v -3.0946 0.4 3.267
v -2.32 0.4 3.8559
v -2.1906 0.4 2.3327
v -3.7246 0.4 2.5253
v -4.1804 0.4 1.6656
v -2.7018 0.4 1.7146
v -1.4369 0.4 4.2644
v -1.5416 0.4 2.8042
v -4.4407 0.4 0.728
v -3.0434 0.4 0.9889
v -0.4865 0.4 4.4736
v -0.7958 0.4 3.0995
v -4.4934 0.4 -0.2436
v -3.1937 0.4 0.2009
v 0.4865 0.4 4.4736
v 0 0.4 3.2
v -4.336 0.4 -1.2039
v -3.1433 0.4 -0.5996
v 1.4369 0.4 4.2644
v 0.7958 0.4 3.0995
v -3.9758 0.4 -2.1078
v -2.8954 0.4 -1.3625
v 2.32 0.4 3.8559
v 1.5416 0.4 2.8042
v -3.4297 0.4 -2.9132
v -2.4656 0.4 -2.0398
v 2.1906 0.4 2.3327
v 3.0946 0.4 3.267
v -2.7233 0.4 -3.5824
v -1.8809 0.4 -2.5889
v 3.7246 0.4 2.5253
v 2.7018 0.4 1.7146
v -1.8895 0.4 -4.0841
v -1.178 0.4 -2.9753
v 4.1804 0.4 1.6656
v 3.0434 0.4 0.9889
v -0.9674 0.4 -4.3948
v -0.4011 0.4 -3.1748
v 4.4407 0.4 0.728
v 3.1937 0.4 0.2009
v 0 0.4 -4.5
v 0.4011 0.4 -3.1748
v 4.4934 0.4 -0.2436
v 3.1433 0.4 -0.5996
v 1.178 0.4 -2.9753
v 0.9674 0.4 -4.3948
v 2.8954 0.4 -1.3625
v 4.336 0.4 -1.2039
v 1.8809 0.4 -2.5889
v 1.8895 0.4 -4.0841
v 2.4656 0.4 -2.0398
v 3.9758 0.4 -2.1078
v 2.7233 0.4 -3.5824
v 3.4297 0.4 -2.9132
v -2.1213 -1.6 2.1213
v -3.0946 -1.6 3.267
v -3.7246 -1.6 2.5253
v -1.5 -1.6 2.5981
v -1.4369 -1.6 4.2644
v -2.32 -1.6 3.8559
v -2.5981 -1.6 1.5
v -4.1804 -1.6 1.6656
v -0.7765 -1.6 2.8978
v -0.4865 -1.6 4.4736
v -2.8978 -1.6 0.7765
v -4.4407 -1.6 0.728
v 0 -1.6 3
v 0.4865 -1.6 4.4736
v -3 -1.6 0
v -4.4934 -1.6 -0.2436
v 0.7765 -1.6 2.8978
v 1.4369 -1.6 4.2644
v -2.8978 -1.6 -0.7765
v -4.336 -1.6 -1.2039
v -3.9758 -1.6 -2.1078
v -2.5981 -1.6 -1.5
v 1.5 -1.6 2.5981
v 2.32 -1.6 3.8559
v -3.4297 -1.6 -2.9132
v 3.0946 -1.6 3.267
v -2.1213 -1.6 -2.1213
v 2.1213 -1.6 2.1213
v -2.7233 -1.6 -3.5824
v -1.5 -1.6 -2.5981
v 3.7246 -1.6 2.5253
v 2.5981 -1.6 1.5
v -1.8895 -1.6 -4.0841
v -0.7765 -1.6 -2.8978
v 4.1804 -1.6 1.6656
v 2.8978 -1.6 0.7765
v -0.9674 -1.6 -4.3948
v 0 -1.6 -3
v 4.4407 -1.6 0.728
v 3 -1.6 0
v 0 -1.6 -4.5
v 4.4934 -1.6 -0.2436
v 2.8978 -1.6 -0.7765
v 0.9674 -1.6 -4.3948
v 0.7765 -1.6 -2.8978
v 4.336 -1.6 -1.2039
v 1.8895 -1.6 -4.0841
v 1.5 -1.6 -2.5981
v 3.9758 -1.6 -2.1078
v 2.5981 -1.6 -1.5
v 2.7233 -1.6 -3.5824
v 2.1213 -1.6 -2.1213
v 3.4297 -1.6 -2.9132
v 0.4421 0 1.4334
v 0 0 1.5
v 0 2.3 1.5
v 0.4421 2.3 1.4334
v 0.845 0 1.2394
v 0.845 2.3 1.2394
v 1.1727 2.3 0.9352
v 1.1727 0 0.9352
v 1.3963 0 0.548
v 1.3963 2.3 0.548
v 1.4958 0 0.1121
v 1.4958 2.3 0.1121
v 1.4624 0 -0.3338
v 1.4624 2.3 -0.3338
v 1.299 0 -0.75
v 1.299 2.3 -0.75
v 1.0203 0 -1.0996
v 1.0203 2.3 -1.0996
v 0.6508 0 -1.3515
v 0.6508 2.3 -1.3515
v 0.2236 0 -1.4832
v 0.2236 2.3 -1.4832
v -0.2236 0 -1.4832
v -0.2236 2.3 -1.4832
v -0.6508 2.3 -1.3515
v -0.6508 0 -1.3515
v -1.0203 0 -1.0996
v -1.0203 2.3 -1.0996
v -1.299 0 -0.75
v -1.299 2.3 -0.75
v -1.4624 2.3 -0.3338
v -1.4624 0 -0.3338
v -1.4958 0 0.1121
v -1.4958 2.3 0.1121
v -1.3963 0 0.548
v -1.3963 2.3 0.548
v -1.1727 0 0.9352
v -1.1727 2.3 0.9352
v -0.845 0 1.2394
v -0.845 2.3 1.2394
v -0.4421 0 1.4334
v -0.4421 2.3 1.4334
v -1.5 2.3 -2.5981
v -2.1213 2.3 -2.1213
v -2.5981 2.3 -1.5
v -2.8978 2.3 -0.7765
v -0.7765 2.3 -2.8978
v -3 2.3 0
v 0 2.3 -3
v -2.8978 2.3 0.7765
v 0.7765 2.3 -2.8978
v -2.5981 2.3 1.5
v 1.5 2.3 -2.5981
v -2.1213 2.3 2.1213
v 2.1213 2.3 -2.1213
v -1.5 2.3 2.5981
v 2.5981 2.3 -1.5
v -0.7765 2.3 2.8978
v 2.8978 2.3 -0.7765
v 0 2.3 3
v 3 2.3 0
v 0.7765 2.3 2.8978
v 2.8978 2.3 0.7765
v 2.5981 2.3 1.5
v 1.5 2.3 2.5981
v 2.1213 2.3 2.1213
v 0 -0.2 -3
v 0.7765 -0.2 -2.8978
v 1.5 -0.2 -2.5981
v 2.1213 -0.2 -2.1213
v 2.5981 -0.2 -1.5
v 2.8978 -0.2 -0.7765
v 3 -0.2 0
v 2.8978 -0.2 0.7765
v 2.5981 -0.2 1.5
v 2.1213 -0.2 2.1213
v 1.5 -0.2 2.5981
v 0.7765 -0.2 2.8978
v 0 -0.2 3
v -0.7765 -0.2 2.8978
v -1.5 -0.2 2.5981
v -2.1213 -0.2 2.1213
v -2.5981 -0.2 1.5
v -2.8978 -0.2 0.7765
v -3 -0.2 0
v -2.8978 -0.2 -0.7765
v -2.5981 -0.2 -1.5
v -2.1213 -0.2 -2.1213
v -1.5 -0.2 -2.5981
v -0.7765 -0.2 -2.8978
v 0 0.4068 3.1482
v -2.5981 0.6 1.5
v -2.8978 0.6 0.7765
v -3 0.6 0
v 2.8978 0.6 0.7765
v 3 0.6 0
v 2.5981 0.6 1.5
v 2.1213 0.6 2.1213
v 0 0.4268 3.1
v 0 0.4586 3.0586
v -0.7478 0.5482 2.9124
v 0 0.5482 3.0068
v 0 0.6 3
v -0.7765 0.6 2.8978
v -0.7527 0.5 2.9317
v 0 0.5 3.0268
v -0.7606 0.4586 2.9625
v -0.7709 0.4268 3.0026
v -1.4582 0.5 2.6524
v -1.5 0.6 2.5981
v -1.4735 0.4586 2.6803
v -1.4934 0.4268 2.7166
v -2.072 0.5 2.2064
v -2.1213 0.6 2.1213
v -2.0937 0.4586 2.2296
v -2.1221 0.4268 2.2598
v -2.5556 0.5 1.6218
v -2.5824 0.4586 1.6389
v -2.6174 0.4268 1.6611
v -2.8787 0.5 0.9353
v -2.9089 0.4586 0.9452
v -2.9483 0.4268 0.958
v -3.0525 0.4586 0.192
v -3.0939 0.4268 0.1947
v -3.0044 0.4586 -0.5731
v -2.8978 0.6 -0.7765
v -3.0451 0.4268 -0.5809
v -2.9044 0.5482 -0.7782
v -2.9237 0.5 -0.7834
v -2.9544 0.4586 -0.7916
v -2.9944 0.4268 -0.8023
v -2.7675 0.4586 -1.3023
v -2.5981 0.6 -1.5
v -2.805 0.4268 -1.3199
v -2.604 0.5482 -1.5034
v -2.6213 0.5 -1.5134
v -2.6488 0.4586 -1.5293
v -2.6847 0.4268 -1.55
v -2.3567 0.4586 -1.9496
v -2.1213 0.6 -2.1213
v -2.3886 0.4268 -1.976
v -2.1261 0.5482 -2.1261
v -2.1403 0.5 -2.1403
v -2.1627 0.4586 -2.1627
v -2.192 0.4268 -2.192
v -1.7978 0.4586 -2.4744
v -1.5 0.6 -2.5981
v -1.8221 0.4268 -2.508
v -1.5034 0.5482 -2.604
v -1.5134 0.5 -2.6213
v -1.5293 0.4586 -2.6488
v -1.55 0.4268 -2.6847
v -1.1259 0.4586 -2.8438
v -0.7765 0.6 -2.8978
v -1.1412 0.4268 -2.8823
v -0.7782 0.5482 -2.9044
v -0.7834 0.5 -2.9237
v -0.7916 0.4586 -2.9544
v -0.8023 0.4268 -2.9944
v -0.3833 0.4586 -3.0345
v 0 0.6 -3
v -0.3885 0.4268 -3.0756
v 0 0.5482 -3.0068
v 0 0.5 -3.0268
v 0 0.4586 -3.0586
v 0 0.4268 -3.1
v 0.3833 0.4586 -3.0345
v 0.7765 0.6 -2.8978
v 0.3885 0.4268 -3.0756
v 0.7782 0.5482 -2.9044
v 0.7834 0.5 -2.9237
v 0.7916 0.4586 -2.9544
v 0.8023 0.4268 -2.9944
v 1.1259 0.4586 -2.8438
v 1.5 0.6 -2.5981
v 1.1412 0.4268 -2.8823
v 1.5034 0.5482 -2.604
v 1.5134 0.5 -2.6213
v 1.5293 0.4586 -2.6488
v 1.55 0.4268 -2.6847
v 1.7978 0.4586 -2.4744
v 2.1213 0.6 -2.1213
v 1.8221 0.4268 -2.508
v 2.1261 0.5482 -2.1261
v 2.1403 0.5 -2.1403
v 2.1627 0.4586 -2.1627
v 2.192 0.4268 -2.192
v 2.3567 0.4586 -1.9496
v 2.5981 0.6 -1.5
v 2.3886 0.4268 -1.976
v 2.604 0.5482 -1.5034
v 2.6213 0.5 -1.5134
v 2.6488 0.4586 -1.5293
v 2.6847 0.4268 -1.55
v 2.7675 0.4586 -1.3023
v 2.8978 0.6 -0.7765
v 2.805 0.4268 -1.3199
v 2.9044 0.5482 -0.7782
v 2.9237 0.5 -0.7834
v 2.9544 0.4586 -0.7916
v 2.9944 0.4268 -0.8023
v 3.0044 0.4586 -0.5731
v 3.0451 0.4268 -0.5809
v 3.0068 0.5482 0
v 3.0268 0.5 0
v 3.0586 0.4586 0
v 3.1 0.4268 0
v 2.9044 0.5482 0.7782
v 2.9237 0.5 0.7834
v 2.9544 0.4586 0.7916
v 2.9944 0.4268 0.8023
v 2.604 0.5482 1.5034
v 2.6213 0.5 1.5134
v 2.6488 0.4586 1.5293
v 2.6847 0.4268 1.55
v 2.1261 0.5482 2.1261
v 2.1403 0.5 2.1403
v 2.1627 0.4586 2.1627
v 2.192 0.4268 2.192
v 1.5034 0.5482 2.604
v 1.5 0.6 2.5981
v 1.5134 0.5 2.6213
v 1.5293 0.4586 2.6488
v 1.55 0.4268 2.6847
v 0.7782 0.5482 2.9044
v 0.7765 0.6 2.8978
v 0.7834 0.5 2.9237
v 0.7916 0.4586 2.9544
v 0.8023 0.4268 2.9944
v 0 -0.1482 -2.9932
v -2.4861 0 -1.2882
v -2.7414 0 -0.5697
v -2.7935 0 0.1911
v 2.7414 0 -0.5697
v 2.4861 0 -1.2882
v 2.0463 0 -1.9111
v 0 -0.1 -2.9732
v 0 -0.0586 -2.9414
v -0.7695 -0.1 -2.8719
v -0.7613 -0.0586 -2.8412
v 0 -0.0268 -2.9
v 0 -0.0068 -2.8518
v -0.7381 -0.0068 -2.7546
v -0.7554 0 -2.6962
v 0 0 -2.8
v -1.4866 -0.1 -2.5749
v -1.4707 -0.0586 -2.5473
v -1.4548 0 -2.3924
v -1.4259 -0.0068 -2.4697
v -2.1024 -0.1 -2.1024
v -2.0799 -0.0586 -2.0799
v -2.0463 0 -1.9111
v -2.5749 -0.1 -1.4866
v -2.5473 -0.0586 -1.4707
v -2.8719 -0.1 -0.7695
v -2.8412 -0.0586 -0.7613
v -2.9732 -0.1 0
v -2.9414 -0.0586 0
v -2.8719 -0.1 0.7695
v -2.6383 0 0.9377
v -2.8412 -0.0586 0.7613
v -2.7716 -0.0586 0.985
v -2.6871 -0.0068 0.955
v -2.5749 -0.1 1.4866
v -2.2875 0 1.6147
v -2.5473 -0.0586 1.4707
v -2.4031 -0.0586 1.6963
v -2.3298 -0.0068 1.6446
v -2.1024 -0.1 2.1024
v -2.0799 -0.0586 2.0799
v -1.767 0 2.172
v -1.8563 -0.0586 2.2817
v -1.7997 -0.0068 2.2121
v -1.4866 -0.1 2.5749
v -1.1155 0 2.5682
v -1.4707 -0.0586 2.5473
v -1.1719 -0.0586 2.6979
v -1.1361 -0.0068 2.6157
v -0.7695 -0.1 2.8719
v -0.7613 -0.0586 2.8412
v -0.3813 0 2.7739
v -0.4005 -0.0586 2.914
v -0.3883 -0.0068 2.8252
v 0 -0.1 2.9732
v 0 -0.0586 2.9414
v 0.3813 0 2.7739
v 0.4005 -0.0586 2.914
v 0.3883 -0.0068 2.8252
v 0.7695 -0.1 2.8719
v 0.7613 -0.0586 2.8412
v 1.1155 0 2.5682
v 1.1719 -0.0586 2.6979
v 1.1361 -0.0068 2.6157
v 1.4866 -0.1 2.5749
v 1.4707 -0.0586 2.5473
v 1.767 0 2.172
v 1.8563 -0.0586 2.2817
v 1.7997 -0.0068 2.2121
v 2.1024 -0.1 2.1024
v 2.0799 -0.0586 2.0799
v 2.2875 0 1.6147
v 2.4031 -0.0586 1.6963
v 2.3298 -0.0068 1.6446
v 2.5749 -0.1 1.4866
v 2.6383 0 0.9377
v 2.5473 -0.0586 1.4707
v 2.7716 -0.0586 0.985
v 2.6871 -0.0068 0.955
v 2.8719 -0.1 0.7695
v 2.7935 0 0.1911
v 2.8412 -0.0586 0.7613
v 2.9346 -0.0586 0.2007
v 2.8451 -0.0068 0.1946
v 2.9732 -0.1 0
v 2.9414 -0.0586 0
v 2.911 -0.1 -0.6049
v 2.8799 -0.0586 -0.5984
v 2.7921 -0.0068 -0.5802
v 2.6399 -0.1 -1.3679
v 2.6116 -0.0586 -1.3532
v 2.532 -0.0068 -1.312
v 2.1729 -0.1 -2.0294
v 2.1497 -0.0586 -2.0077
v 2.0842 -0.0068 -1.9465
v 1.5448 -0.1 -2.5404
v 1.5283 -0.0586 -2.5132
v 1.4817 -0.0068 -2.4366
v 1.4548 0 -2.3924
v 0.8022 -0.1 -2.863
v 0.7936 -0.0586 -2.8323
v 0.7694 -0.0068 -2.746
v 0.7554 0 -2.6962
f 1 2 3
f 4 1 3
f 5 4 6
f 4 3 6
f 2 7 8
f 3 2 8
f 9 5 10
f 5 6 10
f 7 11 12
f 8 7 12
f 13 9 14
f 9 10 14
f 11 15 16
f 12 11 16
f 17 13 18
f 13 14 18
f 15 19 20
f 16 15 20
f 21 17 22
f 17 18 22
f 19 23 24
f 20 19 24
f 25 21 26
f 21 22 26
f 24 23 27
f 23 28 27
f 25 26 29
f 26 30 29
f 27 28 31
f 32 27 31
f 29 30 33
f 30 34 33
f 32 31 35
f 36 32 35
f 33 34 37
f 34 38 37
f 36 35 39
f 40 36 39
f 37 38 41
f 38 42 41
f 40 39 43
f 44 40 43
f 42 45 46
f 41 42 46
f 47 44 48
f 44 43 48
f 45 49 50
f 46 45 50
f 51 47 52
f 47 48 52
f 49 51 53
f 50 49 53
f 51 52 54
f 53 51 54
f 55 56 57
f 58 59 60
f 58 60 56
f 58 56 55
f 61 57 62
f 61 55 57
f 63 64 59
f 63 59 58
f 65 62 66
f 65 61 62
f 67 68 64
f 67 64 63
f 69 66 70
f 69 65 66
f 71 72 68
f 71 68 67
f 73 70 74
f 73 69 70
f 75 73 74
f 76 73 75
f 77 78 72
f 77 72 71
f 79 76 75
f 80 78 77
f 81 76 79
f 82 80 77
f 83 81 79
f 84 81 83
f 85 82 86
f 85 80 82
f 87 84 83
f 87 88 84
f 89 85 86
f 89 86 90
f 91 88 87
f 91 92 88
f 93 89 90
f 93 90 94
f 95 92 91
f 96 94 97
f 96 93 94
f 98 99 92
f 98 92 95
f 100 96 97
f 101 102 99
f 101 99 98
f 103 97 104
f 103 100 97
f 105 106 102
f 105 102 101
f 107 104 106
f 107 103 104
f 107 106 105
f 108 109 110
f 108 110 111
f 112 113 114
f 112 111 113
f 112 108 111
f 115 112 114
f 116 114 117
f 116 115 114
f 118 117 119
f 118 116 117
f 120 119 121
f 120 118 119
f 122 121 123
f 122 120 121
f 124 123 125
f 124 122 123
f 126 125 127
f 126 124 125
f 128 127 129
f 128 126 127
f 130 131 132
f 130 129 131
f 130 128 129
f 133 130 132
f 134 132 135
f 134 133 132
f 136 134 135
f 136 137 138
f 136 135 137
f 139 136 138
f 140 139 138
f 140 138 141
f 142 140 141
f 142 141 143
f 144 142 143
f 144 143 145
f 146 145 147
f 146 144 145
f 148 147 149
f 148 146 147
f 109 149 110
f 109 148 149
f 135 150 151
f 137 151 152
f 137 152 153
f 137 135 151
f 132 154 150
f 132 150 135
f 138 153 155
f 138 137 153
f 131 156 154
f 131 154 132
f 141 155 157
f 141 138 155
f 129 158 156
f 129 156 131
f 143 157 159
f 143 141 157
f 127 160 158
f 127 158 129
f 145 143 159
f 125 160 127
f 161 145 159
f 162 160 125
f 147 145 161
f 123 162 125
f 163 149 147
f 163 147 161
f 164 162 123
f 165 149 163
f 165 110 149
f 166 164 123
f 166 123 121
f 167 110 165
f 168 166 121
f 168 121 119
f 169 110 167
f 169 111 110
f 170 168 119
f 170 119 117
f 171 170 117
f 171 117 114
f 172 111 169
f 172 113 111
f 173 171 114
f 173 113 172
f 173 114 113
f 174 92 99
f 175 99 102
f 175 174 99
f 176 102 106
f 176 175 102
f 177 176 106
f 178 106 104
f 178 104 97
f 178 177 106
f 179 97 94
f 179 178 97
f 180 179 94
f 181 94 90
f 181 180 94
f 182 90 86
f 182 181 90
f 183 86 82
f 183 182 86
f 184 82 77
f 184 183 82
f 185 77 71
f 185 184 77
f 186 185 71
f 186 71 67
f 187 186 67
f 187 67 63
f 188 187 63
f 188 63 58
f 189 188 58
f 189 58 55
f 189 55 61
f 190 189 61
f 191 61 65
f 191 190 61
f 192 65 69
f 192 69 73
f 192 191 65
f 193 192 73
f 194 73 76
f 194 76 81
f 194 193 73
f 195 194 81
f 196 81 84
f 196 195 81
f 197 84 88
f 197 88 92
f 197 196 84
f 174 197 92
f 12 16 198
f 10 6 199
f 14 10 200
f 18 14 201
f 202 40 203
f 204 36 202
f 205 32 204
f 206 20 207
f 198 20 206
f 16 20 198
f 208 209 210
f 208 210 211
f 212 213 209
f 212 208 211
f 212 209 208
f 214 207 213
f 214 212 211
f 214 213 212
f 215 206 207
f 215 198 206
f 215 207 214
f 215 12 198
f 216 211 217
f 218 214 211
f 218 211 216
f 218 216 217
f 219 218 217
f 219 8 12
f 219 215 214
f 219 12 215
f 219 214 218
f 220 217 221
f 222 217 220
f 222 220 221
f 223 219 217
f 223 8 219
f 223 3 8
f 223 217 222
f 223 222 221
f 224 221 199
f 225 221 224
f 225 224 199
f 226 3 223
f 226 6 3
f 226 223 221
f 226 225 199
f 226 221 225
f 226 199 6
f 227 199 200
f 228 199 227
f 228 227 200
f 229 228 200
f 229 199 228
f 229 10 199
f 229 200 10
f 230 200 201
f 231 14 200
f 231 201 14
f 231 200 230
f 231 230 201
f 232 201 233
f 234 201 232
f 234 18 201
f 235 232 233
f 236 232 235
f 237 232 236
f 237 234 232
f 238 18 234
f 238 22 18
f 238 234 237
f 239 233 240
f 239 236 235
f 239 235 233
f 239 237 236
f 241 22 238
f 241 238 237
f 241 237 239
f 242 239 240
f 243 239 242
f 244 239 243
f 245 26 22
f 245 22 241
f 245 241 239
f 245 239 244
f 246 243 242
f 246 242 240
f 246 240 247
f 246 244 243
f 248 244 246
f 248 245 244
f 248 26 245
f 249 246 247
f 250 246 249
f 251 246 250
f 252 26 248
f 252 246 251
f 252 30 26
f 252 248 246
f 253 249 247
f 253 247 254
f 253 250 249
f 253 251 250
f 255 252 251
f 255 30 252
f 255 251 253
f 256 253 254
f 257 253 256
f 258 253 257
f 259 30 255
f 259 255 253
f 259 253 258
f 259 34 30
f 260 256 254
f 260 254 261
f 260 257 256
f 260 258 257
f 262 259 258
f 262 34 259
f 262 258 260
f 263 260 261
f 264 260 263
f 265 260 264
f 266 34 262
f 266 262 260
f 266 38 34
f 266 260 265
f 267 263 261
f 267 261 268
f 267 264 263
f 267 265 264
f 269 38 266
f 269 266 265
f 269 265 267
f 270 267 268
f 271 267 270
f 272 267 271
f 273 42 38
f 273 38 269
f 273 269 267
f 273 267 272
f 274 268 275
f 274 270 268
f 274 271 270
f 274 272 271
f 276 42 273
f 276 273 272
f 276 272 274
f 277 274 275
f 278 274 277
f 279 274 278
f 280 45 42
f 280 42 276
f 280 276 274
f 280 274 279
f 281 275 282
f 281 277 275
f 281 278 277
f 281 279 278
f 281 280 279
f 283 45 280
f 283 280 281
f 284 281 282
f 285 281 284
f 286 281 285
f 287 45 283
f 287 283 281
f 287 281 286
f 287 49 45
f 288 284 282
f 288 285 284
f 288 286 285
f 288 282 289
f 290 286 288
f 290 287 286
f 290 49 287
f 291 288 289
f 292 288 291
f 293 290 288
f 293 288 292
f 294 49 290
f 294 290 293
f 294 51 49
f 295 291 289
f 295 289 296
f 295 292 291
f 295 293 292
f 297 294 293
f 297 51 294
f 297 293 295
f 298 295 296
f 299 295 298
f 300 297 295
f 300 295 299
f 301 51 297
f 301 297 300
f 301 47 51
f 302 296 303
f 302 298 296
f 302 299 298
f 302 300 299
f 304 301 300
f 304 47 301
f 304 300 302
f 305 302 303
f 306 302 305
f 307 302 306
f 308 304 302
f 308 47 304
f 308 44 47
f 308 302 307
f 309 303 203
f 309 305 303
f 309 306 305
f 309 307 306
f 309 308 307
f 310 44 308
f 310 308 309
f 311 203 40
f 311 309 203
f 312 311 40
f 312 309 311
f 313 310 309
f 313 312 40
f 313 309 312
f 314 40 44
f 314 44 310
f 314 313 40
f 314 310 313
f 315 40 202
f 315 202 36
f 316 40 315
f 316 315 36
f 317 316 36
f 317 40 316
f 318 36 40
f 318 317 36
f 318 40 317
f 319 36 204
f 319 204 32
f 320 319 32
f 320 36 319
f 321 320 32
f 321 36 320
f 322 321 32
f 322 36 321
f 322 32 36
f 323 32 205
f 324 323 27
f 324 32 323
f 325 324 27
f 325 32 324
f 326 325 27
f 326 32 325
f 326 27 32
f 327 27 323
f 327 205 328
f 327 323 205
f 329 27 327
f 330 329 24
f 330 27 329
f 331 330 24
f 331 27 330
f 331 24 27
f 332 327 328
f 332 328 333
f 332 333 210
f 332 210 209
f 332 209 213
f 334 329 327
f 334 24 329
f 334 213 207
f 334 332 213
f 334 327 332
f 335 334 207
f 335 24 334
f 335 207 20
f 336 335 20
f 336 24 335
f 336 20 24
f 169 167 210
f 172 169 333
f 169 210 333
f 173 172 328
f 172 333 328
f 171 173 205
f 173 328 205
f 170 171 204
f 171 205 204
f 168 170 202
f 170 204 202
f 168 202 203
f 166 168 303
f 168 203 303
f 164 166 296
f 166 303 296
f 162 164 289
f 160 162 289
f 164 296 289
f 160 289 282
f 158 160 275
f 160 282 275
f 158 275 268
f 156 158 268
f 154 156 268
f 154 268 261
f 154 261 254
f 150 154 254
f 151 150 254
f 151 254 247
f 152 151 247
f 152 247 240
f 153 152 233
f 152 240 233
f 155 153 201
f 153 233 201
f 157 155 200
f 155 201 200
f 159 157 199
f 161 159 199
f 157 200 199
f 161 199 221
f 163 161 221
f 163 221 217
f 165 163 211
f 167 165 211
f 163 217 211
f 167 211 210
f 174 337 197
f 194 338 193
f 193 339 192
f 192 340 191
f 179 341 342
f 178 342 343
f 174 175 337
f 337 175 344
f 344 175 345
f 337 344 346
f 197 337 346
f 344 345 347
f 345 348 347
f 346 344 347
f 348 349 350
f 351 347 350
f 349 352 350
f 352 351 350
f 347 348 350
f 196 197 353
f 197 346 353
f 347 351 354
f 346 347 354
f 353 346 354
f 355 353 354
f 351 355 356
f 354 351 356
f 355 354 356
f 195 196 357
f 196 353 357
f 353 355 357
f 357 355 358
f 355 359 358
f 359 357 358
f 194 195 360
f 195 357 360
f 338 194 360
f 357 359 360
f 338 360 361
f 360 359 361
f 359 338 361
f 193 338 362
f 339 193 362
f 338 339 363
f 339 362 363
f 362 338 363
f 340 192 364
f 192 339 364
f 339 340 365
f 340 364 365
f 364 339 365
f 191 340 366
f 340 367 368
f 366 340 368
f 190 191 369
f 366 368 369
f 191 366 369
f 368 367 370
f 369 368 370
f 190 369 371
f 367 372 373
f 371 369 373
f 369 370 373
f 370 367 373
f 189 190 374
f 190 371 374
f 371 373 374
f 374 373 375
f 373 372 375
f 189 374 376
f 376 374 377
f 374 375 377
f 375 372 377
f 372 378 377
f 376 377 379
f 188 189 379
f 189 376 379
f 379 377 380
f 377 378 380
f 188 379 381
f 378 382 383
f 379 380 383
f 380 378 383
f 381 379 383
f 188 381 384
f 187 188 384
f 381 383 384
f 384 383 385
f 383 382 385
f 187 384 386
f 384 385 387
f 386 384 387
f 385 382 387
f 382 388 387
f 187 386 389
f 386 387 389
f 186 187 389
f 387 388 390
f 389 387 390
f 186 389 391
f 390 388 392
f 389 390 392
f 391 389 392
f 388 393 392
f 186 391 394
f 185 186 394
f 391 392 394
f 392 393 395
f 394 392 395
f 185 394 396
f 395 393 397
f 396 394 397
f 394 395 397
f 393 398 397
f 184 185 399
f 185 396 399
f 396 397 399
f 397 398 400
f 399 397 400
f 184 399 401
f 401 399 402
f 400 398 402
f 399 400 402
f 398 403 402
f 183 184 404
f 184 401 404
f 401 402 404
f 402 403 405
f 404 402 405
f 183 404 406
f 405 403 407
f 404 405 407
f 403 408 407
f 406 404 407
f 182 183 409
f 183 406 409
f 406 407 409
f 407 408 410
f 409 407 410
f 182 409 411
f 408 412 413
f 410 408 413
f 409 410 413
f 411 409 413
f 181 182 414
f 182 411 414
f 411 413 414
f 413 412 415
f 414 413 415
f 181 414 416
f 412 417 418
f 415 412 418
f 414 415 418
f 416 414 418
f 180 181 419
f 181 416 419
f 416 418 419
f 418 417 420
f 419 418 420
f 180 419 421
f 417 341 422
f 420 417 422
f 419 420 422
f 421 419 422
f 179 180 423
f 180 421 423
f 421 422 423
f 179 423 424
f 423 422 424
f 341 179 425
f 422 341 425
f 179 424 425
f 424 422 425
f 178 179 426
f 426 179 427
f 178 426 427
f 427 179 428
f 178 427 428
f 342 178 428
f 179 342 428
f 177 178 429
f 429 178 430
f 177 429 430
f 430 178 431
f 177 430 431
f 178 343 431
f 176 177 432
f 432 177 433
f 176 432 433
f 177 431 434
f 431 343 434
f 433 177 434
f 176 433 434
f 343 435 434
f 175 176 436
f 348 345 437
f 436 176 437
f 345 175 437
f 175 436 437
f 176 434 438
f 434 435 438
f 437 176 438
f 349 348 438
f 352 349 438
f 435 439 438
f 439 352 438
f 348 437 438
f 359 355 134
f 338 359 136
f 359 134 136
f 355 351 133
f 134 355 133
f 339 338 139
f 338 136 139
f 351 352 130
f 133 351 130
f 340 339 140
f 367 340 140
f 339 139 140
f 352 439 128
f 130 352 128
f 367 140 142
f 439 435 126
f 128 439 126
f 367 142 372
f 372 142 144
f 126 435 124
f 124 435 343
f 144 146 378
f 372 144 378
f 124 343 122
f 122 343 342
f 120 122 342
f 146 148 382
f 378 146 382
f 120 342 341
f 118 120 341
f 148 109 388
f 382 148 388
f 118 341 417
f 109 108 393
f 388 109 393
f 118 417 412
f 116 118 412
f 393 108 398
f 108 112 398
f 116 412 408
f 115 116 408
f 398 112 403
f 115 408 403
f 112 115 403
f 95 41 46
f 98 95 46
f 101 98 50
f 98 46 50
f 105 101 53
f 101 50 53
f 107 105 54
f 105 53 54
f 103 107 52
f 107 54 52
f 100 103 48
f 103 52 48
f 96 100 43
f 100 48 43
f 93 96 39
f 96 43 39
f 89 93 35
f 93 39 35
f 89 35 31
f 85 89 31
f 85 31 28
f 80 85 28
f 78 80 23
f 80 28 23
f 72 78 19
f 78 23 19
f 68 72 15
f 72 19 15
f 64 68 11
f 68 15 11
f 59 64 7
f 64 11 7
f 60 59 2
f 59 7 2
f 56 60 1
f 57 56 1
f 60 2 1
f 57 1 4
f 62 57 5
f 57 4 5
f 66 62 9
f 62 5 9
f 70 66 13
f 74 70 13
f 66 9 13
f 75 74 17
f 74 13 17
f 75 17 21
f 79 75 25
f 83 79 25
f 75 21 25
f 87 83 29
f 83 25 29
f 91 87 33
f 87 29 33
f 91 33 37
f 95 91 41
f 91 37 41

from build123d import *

# Parameters (mm, degrees)
SKETCH1_R                = 3
BOSS_EXTRUDE1_DEPTH      = 2.3
SHELL1_T                 = -1.5
BOSS_EXTRUDE2_DEPTH      = 1.6
BOSS_EXTRUDE2_DEPTH_BACK = 0.4
SKETCH2_R                = 4.5
SKETCH2_R_2              = 3
FILLET4_R                = 0.2


with BuildPart() as part:
    # Sketch1 → Boss-Extrude1 (new body)
    with BuildSketch(Plane(origin=(0, 0, 0), x_dir=(1, 0, 0), z_dir=(0, 1, 0))):
        with Locations(Location((0, 0, 0), (0, 0, 270))):
            Circle(SKETCH1_R)
    extrude(amount=BOSS_EXTRUDE1_DEPTH)

    # Shell1
    shell1_openings = [part.faces().sort_by_distance(p)[0] for p in [
        (0, 2.3, 0),
        (0, 0, 0),
    ]]
    offset(amount=SHELL1_T, openings=shell1_openings, kind=Kind.INTERSECTION)

    # Sketch2 → Boss-Extrude2 (add, two sides: drawn at the far end of the back side and taken through both)
    with BuildSketch(Plane.XZ.offset(-BOSS_EXTRUDE2_DEPTH_BACK)):
        with Locations(Location((0, 0, 0), (0, 0, 270))):
            Circle(SKETCH2_R)
        with Locations(Location((0, 0, 0), (0, 0, 270))):
            Circle(SKETCH2_R_2, mode=Mode.SUBTRACT)
    extrude(amount=BOSS_EXTRUDE2_DEPTH + BOSS_EXTRUDE2_DEPTH_BACK)

    # Fillet4
    fillet4_edges = [part.edges().sort_by_distance(p)[0] for p in [
        (0, 0.4, -3),
        (0, 0, 3),
    ]]
    fillet(fillet4_edges, radius=FILLET4_R)


solid = part.part
